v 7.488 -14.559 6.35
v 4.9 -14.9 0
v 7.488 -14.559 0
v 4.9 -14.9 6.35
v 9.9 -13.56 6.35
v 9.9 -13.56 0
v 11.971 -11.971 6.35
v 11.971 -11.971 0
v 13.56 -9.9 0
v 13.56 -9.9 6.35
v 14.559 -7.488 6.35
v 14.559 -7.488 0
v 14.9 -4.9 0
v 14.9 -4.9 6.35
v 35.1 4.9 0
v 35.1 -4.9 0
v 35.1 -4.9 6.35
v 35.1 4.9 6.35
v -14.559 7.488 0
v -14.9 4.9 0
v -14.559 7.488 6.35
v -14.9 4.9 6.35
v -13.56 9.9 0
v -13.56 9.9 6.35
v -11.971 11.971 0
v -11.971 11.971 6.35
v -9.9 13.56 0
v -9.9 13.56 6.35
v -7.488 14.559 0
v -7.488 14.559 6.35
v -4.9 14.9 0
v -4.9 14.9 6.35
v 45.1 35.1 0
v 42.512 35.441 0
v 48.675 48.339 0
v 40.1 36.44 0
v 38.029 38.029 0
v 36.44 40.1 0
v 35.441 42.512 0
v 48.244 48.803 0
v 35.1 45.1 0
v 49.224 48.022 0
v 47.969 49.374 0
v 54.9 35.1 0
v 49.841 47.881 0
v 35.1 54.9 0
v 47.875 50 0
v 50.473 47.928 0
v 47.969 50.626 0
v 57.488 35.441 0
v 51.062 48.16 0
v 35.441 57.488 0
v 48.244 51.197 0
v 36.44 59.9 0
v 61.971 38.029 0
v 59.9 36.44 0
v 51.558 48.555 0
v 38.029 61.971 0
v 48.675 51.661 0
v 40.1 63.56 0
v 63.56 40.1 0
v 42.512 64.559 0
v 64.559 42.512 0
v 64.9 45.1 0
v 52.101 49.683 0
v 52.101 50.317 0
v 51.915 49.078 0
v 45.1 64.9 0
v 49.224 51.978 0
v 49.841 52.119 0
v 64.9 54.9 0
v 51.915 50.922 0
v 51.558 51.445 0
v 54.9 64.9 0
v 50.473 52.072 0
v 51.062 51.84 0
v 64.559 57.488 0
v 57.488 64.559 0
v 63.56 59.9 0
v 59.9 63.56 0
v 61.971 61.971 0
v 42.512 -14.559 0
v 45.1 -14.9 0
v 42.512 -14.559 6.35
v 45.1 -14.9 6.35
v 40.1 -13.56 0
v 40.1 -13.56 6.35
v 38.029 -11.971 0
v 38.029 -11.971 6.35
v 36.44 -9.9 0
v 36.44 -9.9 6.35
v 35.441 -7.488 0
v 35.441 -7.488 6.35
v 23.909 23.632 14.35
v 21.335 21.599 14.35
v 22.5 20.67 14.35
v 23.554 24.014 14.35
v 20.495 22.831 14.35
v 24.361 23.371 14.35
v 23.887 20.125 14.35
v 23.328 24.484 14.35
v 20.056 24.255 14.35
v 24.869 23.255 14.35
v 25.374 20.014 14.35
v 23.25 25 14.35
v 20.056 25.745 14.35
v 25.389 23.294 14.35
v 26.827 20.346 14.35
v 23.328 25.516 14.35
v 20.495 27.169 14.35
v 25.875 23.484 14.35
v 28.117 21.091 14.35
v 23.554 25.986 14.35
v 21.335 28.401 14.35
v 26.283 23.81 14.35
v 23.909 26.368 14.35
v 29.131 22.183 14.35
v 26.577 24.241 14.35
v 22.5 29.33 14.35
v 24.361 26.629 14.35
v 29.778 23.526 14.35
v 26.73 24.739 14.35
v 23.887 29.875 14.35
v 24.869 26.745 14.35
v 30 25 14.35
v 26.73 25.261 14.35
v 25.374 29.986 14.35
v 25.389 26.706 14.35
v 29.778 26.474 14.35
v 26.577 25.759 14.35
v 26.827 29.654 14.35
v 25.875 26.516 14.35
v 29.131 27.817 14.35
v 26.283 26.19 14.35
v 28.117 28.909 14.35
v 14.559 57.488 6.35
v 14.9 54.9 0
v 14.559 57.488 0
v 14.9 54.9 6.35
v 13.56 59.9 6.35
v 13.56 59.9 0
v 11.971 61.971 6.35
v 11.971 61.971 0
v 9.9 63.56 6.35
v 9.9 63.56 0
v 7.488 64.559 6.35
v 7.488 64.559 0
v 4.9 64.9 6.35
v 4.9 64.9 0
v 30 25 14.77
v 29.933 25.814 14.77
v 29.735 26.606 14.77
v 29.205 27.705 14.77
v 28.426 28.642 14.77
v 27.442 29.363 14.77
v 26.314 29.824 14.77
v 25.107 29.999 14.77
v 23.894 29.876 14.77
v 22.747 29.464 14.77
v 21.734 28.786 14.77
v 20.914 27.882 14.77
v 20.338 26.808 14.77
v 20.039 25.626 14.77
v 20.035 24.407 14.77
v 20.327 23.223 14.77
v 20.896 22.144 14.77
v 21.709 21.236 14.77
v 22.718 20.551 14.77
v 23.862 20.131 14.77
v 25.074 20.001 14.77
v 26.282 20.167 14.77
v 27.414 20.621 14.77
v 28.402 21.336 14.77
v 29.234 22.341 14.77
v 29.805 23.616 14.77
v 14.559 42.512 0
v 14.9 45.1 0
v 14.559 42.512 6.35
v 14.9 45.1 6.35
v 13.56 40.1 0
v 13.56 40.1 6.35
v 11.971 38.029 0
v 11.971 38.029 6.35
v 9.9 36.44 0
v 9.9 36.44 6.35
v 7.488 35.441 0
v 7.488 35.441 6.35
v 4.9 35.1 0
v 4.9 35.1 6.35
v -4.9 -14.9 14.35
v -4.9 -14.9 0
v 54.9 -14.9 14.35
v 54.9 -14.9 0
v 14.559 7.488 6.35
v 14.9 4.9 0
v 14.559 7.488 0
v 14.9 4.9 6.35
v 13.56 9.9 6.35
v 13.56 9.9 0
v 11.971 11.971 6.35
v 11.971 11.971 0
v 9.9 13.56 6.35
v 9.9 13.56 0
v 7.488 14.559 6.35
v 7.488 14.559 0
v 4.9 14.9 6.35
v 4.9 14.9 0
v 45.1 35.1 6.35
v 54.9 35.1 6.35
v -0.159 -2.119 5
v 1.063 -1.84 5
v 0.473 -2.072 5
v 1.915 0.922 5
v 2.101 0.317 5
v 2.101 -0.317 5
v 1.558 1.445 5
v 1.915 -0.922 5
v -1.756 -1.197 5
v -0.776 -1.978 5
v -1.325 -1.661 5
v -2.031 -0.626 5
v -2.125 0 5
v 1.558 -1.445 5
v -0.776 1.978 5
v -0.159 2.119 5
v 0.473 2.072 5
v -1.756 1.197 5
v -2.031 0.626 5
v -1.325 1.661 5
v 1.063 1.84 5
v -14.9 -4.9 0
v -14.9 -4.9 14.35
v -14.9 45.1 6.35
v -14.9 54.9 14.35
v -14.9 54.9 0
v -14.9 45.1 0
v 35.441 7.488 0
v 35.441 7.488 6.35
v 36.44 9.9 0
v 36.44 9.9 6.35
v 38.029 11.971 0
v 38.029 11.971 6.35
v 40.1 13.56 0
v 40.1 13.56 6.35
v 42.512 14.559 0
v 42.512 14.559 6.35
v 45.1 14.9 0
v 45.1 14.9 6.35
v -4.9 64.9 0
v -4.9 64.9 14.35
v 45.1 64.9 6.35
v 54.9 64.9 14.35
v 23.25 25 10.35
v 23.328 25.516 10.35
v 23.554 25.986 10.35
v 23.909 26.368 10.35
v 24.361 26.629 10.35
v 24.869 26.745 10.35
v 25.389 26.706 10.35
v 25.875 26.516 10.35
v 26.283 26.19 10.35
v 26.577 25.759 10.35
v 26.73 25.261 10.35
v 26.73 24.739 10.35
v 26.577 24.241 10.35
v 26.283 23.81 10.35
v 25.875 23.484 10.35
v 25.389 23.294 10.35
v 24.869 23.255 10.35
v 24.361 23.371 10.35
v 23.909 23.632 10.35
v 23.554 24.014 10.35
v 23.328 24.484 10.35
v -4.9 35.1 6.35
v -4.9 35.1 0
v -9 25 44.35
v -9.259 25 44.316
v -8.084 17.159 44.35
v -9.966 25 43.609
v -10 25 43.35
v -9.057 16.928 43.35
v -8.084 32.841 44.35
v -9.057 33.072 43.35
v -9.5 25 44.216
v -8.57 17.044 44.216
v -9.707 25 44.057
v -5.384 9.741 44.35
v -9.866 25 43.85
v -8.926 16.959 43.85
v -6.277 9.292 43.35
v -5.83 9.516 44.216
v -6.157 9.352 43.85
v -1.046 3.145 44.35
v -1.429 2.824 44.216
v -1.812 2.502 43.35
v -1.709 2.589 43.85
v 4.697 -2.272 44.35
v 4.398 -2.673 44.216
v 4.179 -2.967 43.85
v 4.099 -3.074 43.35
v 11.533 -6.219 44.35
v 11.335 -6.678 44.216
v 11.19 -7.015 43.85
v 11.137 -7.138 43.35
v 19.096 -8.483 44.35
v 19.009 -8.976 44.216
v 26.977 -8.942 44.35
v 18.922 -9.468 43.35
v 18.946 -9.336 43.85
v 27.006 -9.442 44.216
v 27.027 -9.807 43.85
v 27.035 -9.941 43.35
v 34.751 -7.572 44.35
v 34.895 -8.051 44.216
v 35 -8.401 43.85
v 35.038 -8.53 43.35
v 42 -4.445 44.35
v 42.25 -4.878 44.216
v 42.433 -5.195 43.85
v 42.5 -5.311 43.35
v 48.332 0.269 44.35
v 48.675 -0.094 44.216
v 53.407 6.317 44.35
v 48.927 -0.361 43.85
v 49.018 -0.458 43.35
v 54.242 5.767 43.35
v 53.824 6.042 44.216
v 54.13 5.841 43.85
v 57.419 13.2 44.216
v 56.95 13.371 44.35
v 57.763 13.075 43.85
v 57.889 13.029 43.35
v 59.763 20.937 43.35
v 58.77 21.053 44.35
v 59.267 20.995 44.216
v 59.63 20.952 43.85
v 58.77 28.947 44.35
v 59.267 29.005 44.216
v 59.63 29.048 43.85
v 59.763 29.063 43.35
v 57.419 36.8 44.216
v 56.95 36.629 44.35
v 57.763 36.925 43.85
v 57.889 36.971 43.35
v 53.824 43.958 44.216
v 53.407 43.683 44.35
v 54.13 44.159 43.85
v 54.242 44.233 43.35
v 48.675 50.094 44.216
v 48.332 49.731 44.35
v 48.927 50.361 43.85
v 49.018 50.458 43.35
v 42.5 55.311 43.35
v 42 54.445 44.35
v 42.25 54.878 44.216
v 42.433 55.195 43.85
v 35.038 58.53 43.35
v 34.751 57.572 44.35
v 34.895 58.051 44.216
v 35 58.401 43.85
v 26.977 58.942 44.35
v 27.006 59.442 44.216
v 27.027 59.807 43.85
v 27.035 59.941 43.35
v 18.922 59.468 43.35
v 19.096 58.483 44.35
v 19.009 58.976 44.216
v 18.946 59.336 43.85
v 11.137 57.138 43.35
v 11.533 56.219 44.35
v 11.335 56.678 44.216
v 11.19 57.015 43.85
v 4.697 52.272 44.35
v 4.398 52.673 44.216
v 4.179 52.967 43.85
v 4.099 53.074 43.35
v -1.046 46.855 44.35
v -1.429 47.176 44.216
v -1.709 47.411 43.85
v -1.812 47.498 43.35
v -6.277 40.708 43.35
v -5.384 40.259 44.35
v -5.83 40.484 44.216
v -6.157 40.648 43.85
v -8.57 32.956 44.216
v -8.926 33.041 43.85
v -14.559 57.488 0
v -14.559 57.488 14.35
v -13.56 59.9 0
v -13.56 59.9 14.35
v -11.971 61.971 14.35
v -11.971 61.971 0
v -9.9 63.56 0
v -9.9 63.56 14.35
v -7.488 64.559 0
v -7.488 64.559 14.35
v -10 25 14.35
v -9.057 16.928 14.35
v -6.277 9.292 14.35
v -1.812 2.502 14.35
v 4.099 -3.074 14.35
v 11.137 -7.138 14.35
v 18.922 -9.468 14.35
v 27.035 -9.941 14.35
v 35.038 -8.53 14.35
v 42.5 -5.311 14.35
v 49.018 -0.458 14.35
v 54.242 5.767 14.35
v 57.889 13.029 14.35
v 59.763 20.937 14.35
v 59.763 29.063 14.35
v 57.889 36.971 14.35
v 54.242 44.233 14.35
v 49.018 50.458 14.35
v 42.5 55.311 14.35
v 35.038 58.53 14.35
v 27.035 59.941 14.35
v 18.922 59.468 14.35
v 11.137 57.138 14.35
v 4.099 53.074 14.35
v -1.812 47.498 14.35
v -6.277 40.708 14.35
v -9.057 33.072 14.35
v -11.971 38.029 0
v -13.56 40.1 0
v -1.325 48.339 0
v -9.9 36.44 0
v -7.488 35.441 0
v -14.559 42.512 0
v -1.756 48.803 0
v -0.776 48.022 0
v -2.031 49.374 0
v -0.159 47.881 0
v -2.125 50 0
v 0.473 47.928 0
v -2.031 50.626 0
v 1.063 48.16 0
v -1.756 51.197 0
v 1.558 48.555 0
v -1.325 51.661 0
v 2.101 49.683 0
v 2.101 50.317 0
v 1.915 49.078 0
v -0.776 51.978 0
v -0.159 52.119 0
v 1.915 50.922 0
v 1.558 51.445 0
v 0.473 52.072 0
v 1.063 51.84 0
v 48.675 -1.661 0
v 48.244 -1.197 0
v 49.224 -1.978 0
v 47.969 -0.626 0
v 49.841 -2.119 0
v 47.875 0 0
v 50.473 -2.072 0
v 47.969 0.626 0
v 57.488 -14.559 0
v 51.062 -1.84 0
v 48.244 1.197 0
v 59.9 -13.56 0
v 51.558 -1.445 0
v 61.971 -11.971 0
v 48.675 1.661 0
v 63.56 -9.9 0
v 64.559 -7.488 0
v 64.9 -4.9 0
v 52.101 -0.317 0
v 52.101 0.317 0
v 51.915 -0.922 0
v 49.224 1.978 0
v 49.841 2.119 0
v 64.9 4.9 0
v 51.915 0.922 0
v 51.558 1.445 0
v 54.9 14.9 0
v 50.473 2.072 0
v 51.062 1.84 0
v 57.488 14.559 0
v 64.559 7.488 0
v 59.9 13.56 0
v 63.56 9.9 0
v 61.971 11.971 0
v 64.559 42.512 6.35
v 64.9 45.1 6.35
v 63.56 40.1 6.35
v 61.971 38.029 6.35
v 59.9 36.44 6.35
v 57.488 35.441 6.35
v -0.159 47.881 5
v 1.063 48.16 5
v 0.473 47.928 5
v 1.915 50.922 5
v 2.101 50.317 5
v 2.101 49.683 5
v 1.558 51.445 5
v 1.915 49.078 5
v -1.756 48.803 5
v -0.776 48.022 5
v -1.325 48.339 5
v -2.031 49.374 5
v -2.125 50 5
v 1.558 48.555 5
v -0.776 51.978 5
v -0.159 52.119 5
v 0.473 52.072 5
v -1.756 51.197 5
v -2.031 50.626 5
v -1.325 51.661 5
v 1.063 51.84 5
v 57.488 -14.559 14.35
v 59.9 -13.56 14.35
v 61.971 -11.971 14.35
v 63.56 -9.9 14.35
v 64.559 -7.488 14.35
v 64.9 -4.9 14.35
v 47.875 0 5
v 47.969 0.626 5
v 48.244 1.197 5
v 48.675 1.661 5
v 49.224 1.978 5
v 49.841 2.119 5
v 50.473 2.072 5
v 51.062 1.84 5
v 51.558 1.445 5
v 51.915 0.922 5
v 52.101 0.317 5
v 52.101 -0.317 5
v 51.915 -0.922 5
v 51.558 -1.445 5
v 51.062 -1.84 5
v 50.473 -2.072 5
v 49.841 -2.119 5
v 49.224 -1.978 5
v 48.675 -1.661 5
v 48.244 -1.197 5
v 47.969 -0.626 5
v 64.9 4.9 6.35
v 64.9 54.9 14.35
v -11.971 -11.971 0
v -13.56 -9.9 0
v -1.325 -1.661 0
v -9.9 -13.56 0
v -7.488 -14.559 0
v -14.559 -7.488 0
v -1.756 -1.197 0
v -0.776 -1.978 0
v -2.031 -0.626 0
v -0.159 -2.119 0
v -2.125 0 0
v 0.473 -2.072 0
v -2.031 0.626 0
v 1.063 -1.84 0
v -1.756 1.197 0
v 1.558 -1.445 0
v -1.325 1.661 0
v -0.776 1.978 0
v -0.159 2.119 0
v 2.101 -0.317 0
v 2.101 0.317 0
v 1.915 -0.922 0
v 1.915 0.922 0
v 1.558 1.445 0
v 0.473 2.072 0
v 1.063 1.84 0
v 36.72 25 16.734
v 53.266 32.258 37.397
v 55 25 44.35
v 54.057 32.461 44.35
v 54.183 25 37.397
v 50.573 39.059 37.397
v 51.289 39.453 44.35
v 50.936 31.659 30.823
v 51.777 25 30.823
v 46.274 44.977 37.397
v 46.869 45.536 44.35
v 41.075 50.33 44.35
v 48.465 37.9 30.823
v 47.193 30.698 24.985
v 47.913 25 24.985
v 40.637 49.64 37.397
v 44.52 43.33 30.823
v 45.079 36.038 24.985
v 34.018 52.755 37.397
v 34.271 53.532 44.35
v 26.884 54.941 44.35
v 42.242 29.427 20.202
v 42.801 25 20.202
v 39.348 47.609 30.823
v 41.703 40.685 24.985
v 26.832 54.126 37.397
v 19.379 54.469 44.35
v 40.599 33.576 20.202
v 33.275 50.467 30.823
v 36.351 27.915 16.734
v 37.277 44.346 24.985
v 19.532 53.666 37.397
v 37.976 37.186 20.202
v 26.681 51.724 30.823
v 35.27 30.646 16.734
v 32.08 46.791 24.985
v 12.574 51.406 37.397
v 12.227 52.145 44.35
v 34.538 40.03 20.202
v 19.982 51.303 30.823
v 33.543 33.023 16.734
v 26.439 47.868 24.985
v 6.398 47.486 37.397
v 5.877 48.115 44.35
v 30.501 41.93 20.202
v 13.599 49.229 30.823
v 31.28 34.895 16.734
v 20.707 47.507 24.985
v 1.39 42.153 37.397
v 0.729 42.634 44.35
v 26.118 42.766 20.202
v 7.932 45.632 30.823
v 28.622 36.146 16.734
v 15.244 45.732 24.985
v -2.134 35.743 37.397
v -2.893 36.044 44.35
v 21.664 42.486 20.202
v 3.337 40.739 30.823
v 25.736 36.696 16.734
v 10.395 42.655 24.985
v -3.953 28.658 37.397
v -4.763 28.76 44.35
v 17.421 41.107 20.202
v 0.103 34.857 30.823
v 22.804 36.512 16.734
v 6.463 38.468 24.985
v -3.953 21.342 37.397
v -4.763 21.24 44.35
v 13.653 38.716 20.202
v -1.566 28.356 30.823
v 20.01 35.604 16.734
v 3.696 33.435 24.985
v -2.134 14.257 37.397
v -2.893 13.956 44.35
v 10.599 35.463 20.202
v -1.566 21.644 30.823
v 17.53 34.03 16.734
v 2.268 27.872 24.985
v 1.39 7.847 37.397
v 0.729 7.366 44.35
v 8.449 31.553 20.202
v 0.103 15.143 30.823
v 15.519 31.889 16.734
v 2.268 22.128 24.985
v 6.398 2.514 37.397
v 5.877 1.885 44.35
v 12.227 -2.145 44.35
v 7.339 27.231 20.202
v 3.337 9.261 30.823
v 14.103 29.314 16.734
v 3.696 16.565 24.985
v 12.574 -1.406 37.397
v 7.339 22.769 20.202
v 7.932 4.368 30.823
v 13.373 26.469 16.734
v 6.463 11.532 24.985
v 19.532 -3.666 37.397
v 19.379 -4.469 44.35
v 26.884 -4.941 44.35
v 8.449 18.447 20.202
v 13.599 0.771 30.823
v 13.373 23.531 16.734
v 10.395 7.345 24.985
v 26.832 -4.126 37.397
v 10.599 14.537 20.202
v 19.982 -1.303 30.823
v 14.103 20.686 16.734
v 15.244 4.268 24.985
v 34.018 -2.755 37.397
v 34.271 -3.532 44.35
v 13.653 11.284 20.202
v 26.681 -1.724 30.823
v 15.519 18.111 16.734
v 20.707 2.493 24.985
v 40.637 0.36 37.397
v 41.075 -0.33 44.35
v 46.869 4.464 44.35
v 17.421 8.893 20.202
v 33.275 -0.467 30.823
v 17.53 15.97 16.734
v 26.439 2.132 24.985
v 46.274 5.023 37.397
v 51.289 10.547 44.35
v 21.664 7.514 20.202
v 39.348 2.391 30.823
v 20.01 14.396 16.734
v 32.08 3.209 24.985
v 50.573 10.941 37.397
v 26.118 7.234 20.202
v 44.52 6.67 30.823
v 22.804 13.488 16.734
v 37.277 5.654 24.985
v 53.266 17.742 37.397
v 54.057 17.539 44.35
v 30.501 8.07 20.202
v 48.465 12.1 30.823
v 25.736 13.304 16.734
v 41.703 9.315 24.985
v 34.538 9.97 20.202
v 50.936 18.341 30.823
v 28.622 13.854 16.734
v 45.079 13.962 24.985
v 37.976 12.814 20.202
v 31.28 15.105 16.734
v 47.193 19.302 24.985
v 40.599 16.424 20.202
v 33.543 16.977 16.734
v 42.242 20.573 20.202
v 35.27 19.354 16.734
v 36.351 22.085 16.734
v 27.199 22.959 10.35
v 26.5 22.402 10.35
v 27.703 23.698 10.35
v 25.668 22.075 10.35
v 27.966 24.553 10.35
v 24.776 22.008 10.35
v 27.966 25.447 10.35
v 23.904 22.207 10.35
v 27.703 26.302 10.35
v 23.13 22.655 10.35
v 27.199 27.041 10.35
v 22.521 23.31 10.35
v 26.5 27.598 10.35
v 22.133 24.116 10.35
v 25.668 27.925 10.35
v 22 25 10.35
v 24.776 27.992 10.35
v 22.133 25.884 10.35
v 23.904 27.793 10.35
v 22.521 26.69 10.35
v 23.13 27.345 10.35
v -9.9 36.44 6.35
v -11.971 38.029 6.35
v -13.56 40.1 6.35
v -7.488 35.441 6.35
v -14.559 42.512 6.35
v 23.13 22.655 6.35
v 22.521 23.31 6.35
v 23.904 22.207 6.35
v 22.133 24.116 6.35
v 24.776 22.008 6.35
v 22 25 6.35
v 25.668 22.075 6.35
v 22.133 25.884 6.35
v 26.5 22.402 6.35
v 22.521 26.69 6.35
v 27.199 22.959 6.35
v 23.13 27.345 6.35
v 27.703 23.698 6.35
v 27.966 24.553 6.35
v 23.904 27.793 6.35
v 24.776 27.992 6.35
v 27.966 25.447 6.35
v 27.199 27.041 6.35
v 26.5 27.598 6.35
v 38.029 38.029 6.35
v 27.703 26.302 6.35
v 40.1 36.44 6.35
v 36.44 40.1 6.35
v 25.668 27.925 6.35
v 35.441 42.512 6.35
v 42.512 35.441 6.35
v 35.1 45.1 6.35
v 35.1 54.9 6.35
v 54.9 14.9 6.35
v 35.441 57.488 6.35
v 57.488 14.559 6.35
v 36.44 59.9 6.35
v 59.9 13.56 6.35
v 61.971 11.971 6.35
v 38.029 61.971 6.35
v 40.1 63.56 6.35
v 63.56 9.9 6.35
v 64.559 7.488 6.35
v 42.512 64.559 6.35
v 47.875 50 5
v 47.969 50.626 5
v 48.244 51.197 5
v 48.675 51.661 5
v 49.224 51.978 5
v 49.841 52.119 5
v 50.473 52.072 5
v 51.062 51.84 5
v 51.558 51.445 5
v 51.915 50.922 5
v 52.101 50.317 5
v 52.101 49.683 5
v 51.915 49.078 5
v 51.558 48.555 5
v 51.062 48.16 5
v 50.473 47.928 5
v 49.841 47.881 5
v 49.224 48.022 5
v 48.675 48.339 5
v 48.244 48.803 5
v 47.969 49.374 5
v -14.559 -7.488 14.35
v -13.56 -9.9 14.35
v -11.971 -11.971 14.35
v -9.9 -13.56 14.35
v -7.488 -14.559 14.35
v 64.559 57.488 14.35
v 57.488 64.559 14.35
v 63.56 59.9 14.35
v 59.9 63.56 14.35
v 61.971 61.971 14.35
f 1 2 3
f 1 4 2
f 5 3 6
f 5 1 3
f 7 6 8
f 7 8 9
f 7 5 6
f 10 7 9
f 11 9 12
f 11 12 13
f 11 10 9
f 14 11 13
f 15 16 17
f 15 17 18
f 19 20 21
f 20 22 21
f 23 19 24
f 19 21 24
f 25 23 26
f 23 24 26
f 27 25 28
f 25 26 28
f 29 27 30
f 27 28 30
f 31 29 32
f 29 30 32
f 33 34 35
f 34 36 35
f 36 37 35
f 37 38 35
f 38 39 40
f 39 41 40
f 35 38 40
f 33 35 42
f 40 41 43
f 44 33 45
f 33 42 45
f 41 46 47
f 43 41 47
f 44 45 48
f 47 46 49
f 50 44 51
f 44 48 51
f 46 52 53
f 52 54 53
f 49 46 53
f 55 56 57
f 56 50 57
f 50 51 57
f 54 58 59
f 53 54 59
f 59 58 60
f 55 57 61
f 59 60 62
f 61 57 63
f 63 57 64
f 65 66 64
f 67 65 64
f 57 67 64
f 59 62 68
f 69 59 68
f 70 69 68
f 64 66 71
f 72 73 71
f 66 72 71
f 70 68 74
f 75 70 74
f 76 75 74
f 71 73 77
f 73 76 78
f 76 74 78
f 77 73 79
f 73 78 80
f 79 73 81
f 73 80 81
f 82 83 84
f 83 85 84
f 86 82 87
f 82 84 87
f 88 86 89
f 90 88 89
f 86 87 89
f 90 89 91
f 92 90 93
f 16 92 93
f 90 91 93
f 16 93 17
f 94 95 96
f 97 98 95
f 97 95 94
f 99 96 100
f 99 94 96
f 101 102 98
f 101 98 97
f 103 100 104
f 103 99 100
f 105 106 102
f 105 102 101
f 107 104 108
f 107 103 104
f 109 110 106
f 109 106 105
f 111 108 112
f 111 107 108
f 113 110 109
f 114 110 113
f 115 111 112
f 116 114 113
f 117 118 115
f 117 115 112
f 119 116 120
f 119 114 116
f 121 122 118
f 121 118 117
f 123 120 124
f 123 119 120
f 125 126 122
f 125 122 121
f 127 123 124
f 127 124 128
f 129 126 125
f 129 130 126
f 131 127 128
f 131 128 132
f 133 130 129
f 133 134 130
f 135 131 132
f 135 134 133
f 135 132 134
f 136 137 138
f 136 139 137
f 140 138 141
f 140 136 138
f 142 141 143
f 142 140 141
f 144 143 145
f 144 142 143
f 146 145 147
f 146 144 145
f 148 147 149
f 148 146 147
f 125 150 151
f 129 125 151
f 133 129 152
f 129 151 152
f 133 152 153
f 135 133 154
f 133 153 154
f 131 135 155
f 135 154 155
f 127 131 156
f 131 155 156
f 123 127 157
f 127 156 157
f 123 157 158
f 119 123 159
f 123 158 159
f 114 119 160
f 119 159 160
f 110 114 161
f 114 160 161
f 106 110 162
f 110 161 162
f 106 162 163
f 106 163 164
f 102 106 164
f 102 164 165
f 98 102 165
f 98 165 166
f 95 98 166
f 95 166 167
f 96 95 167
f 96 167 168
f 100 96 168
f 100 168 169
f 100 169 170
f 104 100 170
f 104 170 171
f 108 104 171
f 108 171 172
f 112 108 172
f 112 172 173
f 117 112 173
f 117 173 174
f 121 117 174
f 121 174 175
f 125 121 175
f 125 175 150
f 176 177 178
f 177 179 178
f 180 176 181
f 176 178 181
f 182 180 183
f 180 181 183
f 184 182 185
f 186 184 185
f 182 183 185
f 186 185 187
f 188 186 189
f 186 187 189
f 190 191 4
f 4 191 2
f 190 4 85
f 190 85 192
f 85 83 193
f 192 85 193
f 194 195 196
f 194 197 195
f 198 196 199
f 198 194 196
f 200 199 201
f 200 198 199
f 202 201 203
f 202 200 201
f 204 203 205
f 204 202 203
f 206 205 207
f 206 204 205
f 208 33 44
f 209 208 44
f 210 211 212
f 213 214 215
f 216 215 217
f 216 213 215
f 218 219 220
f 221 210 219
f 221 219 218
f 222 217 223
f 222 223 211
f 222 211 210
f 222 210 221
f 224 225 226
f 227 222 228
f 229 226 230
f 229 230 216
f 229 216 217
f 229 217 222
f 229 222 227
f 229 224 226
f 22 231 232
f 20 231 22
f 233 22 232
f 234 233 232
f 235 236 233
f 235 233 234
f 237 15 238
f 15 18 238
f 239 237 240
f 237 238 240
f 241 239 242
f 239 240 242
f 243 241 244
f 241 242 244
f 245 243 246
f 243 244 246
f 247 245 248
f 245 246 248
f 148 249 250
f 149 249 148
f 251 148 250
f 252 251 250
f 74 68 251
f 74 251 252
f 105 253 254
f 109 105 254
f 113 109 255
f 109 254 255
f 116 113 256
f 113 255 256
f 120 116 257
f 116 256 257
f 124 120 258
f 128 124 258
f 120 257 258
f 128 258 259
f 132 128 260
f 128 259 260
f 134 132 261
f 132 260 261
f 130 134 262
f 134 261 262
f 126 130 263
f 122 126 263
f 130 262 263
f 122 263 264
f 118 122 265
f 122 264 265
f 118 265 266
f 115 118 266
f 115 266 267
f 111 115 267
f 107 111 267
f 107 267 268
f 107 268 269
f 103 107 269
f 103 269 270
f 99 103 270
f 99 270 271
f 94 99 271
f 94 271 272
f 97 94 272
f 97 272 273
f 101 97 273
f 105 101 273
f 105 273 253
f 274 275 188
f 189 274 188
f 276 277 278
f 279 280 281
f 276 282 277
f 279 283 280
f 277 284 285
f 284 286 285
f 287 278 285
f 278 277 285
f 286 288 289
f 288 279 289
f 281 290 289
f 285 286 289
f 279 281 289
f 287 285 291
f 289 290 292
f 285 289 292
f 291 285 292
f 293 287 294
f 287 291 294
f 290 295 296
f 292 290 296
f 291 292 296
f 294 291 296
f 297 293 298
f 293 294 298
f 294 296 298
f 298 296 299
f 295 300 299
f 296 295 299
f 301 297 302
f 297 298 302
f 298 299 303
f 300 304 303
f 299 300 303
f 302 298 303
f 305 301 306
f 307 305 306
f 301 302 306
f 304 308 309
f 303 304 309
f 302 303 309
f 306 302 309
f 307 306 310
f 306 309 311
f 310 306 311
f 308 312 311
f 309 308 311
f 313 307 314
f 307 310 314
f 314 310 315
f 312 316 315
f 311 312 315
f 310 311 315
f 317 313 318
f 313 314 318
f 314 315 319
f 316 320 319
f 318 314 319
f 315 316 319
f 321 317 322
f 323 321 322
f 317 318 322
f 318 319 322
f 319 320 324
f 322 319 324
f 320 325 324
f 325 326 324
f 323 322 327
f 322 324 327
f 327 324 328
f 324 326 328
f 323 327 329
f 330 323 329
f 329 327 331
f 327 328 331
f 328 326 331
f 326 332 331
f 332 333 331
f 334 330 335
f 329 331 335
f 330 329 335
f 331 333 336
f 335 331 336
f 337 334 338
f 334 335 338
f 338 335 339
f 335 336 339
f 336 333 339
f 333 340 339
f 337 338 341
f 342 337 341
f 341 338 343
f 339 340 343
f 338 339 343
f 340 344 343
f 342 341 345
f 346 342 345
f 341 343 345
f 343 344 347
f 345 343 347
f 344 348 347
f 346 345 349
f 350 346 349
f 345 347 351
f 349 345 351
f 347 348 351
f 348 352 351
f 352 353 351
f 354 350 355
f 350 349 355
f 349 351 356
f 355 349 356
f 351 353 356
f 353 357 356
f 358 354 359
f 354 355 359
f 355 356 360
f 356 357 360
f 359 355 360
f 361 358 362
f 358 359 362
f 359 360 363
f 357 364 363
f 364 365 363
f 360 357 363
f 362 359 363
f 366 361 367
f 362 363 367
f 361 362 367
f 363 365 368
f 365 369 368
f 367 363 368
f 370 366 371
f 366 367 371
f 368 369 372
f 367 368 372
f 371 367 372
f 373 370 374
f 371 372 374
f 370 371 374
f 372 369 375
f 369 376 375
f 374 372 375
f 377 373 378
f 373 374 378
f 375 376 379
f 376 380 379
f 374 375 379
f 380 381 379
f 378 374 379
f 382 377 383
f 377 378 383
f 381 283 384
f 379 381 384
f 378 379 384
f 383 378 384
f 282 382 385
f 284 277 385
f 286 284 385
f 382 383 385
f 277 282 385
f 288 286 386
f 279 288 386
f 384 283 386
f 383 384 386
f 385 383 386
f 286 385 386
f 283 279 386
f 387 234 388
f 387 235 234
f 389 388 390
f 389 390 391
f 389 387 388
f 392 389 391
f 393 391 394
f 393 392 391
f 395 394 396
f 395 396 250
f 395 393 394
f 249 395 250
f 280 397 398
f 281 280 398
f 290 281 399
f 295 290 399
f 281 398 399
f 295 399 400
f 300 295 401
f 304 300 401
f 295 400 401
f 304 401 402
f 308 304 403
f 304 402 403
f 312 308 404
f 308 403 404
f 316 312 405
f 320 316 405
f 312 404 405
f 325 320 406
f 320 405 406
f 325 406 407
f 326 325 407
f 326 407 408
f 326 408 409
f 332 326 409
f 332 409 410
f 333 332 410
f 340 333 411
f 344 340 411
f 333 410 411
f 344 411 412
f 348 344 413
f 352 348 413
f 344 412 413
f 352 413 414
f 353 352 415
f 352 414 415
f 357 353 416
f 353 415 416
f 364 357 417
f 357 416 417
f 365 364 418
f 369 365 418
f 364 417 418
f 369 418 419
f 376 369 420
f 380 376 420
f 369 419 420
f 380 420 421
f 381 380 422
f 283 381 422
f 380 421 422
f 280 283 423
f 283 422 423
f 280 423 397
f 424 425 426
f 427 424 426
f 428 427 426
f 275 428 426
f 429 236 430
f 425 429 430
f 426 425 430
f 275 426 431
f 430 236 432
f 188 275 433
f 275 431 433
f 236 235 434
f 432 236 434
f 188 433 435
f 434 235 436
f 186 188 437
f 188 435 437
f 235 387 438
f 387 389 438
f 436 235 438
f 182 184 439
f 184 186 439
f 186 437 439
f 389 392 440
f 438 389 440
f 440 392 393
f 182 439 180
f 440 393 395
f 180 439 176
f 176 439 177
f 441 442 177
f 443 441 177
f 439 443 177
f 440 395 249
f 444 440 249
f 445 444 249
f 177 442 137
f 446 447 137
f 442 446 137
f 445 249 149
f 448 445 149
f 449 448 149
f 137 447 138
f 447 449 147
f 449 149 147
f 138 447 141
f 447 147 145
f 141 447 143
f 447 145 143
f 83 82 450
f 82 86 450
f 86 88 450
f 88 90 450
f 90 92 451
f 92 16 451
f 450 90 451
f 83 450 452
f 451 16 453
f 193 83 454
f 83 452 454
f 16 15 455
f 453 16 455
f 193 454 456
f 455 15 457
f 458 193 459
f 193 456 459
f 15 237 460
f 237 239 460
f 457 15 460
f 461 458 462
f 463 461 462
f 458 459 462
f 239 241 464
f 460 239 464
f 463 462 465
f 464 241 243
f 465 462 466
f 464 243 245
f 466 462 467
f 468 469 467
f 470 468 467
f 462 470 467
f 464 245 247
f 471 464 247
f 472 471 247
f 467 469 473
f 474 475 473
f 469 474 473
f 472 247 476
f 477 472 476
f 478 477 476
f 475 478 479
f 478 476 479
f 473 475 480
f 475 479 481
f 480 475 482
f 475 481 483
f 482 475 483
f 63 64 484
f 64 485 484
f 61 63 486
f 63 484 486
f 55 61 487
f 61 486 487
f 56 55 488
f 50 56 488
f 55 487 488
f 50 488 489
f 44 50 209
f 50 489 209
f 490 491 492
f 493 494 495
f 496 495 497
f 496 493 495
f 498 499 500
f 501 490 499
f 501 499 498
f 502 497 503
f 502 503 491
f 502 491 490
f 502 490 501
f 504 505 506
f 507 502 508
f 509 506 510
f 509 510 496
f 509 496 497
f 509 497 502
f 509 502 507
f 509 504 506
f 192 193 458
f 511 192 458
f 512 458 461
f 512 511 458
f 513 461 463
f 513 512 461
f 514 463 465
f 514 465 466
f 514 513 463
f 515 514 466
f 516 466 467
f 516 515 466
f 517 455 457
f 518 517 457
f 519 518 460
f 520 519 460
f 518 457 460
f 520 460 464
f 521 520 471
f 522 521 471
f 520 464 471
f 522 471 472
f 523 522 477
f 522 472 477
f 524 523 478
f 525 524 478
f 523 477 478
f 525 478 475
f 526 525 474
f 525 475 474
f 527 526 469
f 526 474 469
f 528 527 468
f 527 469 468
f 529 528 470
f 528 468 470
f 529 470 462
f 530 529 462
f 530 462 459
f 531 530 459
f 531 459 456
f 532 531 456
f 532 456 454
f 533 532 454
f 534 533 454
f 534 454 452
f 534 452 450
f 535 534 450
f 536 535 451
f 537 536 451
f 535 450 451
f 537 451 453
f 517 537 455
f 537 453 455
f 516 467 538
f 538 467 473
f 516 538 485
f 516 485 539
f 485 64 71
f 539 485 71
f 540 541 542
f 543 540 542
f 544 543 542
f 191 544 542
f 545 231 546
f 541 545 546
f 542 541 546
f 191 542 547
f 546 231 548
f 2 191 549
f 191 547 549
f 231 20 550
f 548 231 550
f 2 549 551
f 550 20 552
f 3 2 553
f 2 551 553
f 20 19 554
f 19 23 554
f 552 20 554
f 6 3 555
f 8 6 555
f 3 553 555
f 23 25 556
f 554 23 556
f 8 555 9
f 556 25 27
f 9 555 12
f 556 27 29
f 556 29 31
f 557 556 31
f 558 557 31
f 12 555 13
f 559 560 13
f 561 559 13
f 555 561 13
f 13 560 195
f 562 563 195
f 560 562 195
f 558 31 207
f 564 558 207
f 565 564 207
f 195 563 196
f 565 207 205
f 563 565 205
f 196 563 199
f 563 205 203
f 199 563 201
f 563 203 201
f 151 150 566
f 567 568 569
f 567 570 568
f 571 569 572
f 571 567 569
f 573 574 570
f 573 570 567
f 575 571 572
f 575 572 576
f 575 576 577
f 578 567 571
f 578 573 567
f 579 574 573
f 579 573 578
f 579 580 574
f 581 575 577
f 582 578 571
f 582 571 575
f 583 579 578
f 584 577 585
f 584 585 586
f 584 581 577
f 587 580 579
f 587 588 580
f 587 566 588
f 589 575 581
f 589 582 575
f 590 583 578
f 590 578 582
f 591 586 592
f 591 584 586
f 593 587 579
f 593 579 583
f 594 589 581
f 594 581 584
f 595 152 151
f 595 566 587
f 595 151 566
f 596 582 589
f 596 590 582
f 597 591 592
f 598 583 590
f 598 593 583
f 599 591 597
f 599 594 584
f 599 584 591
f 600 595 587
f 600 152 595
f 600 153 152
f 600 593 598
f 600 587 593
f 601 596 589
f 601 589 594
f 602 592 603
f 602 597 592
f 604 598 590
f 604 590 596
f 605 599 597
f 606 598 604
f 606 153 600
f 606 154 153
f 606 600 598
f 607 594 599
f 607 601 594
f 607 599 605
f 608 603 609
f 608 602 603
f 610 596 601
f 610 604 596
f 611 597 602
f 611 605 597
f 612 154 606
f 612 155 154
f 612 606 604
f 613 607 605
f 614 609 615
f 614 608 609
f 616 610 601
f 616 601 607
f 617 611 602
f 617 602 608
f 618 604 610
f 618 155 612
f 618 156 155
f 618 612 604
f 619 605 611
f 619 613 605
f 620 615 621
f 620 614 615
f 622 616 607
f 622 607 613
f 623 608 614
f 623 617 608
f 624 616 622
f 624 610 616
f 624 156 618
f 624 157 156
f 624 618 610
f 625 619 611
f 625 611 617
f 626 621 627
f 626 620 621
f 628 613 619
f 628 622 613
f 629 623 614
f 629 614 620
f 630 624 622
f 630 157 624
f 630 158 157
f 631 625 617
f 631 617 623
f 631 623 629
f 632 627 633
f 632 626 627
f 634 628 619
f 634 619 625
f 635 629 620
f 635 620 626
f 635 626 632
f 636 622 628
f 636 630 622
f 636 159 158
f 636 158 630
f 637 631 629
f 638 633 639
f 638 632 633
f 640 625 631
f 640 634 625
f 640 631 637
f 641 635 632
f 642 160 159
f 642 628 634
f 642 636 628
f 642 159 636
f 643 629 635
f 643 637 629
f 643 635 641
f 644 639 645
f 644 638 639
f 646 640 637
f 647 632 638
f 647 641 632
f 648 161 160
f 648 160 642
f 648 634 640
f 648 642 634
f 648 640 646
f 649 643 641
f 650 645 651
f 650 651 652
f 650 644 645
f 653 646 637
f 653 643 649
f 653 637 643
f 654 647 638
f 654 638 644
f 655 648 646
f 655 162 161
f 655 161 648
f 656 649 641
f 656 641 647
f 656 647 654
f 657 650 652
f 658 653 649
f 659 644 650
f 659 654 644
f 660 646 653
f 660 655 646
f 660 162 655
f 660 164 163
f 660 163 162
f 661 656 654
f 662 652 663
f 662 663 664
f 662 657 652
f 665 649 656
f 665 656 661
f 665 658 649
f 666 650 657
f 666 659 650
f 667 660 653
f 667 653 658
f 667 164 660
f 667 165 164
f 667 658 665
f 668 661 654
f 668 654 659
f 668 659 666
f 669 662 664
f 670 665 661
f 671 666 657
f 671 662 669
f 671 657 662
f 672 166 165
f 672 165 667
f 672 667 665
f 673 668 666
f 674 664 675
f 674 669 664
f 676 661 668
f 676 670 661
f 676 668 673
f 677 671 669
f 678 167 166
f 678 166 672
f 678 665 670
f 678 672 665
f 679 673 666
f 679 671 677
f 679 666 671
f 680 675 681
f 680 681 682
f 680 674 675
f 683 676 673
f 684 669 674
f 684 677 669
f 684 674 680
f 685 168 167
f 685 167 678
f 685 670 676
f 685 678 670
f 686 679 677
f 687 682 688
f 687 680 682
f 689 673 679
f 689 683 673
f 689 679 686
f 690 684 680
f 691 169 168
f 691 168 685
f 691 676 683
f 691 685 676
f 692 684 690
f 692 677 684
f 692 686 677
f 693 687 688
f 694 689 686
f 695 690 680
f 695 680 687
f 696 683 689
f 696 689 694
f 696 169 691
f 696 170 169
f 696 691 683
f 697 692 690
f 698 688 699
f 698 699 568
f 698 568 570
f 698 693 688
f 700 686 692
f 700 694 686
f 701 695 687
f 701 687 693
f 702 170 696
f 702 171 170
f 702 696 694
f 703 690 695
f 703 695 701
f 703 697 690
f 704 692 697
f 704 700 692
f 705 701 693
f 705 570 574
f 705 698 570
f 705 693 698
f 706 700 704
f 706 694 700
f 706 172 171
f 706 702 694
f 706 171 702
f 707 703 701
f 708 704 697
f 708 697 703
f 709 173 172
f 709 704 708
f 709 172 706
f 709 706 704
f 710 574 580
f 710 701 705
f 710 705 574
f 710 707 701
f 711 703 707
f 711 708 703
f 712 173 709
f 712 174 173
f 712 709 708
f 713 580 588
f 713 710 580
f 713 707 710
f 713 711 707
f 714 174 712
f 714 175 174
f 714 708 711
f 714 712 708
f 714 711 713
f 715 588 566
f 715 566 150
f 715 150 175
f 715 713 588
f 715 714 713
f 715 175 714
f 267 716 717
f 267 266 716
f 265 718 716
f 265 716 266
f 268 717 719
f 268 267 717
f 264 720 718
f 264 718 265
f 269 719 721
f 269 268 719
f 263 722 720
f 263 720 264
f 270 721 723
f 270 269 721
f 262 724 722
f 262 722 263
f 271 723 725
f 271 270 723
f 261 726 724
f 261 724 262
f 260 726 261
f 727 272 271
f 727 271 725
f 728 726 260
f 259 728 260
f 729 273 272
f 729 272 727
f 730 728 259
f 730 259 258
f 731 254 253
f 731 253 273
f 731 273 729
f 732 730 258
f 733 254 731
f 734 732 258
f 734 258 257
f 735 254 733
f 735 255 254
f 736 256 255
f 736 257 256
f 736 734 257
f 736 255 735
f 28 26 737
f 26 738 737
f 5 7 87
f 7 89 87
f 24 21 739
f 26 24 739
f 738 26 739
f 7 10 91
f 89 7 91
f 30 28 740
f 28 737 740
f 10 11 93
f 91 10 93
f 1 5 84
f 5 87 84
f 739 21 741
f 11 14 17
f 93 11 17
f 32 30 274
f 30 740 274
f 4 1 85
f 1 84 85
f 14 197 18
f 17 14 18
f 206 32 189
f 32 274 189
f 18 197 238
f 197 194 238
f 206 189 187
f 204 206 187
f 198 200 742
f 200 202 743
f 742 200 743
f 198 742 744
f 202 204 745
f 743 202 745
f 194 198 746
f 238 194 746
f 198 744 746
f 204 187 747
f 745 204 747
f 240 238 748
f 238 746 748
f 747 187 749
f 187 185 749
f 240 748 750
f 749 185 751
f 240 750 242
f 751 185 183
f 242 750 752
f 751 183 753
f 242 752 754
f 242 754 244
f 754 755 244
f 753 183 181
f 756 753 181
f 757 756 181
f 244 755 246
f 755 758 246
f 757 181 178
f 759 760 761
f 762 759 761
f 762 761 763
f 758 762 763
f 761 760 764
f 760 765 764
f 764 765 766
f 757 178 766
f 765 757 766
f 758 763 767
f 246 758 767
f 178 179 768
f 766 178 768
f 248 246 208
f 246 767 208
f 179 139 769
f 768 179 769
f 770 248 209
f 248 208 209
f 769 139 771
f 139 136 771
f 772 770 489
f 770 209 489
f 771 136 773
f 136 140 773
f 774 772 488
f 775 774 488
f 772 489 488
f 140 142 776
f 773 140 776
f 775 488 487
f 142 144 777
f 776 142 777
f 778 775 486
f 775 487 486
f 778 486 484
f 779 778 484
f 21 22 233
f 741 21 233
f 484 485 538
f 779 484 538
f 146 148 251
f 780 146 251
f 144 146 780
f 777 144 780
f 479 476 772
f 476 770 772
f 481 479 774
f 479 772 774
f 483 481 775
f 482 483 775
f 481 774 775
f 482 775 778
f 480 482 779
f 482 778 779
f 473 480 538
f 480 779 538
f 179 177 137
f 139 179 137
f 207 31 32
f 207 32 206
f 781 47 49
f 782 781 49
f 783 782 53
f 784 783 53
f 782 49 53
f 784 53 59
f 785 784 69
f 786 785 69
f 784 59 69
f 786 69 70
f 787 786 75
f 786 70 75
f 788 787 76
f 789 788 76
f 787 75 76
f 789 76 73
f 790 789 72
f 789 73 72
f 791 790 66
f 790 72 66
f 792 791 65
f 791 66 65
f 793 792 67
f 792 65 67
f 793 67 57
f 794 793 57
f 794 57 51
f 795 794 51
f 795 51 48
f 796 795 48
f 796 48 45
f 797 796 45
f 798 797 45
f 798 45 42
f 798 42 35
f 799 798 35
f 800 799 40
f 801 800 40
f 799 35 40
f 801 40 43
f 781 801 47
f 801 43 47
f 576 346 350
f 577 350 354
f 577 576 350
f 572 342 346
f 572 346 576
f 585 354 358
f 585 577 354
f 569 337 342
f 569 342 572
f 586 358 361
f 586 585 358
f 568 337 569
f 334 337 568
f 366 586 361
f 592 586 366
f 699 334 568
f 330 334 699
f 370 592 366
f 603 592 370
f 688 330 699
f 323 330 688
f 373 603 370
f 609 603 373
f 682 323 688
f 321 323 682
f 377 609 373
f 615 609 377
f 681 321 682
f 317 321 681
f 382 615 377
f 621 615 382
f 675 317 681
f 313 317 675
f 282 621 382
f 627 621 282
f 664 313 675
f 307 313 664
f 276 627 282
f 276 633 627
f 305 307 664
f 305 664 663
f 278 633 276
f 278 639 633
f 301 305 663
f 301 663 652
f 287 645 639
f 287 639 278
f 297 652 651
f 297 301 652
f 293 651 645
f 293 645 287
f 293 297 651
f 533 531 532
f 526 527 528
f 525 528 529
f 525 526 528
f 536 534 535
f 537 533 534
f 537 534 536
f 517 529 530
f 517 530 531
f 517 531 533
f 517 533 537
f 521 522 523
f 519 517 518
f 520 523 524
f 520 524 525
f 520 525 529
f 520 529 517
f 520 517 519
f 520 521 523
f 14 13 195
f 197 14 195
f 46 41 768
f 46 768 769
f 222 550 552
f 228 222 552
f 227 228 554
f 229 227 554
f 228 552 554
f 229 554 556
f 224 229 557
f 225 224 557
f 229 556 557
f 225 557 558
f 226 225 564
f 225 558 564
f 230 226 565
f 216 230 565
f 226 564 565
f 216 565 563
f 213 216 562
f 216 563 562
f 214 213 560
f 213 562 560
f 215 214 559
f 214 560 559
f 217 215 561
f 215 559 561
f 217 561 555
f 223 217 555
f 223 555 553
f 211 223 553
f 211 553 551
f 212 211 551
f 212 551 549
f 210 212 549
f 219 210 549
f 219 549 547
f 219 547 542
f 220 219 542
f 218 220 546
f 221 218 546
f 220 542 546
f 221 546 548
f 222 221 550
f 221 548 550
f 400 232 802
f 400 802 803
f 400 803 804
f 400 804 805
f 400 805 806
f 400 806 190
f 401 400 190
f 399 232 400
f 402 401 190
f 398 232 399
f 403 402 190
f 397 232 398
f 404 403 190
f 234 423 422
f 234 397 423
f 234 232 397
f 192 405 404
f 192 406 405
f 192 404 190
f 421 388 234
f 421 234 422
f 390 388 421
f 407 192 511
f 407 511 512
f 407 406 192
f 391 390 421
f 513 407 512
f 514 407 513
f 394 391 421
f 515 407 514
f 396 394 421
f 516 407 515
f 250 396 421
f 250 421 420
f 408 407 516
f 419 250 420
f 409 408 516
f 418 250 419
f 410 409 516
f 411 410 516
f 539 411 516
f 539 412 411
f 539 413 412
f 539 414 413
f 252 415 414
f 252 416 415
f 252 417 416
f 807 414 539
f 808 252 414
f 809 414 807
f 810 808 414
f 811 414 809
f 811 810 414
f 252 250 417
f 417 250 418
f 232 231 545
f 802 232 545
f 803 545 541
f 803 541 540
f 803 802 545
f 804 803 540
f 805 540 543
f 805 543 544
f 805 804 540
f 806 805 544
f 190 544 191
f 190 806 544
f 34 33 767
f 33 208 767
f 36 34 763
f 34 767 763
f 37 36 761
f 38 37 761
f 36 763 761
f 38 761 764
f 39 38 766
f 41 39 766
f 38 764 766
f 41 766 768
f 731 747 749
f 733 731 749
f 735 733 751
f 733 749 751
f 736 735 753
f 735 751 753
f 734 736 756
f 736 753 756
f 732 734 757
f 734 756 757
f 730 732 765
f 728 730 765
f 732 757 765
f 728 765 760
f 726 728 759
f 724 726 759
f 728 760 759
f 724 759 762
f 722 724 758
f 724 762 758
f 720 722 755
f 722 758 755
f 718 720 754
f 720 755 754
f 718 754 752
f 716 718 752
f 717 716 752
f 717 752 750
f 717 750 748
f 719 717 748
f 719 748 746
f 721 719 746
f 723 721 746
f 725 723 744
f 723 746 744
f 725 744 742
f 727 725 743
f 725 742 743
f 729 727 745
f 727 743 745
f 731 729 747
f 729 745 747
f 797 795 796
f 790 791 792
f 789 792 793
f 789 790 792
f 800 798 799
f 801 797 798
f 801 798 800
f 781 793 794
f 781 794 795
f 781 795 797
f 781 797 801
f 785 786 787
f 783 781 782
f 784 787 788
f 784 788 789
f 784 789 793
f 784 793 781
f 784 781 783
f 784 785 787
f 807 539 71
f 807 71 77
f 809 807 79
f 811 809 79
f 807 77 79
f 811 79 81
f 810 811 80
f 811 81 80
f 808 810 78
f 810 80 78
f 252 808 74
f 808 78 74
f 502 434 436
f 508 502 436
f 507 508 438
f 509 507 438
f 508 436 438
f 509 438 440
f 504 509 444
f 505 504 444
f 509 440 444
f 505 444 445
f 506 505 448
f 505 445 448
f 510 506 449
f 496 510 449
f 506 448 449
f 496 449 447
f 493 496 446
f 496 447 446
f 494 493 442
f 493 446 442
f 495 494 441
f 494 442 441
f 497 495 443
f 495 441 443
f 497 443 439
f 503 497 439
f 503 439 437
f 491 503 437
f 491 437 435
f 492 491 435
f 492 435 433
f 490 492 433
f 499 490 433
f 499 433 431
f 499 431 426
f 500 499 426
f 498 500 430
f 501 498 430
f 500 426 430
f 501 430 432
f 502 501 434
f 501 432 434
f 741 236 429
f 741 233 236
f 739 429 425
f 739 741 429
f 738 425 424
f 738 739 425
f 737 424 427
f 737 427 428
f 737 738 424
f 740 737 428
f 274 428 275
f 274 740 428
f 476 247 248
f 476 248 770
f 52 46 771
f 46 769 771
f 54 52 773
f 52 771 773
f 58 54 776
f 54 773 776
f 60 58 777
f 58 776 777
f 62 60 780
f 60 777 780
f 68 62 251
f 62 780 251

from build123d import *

# Parameters (mm, degrees)
SKETCH1_W             = 29.8
SKETCH1_H             = 29.8
BOSS_EXTRUDE1_DEPTH   = 6.35
BOSS_EXTRUDE1_2_DEPTH = 6.35
BOSS_EXTRUDE1_3_DEPTH = 6.35
BOSS_EXTRUDE1_4_DEPTH = 6.35
SKETCH2_W             = 79.8
SKETCH2_H             = 79.8
BOSS_EXTRUDE2_DEPTH   = 8
FILLET2_R             = 10
SKETCH3_R             = 35
SKETCH3_R_2           = 30
BOSS_EXTRUDE3_DEPTH   = 30
FILLET3_R             = 30
FILLET4_R             = 1
SKETCH4_R             = 2.125
CUT_EXTRUDE1_DEPTH    = 5
SKETCH6_R             = 5
CUT_EXTRUDE2_DEPTH    = 30
SKETCH7_R             = 1.75
CUT_EXTRUDE3_DEPTH    = 100.337908172
SKETCH8_R             = 3
CUT_EXTRUDE4_DEPTH    = 4


with BuildPart() as part:
    # Sketch1 → Boss-Extrude1 (new body)
    with BuildSketch(Plane.XY):
        Rectangle(SKETCH1_W, SKETCH1_H)
    extrude(amount=BOSS_EXTRUDE1_DEPTH)



with BuildPart() as body_2:
    # Sketch1 → Boss-Extrude1 2 (new body)
    with BuildSketch(Plane.XY):
        with Locations((50, 0)):
            Rectangle(SKETCH1_W, SKETCH1_H)
    extrude(amount=BOSS_EXTRUDE1_2_DEPTH)


with BuildPart() as body_3:
    # Sketch1 → Boss-Extrude1 3 (new body)
    with BuildSketch(Plane.XY):
        with Locations((50, 50)):
            Rectangle(SKETCH1_W, SKETCH1_H)
    extrude(amount=BOSS_EXTRUDE1_3_DEPTH)


with BuildPart() as body_4:
    # Sketch1 → Boss-Extrude1 4 (new body)
    with BuildSketch(Plane.XY):
        with Locations((0, 50)):
            Rectangle(SKETCH1_W, SKETCH1_H)
    extrude(amount=BOSS_EXTRUDE1_4_DEPTH)


with BuildPart() as part_1:
    add(part.part)

    add(body_2.part)  # Boss-Extrude2 merges body 2

    add(body_3.part)  # Boss-Extrude2 merges body 3

    add(body_4.part)  # Boss-Extrude2 merges body 4
    # Sketch2 → Boss-Extrude2 (add)
    with BuildSketch(Plane.XY.offset(6.35)):
        with Locations((25, 25)):
            Rectangle(SKETCH2_W, SKETCH2_H)
    extrude(amount=BOSS_EXTRUDE2_DEPTH)

    # Fillet2
    fillet2_edges = [part_1.edges().sort_by_distance(p)[0] for p in [
        (-14.9, 64.9, 7.175),
        (64.9, -14.9, 7.175),
        (64.9, 64.9, 7.175),
        (35.1, 14.9, 3.175),
        (35.1, -14.9, 3.175),
        (64.9, 14.9, 3.175),
        (35.1, 64.9, 3.175),
        (35.1, 35.1, 3.175),
        (64.9, 35.1, 3.175),
        (-14.9, 35.1, 3.175),
        (14.9, 35.1, 3.175),
        (14.9, 64.9, 3.175),
        (-14.9, 14.9, 3.175),
        (14.9, 14.9, 3.175),
        (14.9, -14.9, 3.175),
        (-14.9, -14.9, 7.175),
    ]]
    fillet(fillet2_edges, radius=FILLET2_R)

    # Sketch3 → Boss-Extrude3 (add)
    with BuildSketch(Plane.XY.offset(14.35)):
        with Locations(Location((25, 25, 0), (0, 0, 180))):
            Circle(SKETCH3_R)
        with Locations((25, 25)):
            Circle(SKETCH3_R_2, mode=Mode.SUBTRACT)
    extrude(amount=BOSS_EXTRUDE3_DEPTH)

    # Fillet3
    fillet3_edges = [part_1.edges().sort_by_distance(p)[0] for p in [
        (-5, 25, 14.35),
    ]]
    fillet(fillet3_edges, radius=FILLET3_R - 0.0001)  # a hair under: the kernel refuses the full size

    # Fillet4
    fillet4_edges = [part_1.edges().sort_by_distance(p)[0] for p in [
        (60, 25, 44.35),
    ]]
    fillet(fillet4_edges, radius=FILLET4_R)

    # Sketch4 → Cut-Extrude1 (cut)
    with BuildSketch(Plane(origin=(0, 0, 0), x_dir=(-1, 0, 0), z_dir=(0, 0, -1))):
        with Locations((0, 50)):
            Circle(SKETCH4_R)
        Circle(SKETCH4_R)
        with Locations((-50, 0)):
            Circle(SKETCH4_R)
        with Locations((-50, 50)):
            Circle(SKETCH4_R)
    extrude(amount=-CUT_EXTRUDE1_DEPTH, mode=Mode.SUBTRACT)

    # Sketch6 → Cut-Extrude2 (cut)
    with BuildSketch(Plane.XY.offset(44.35)):
        with Locations((25, 25)):
            Circle(SKETCH6_R)
    extrude(amount=-CUT_EXTRUDE2_DEPTH, mode=Mode.SUBTRACT)

    # Sketch7 → Cut-Extrude3 (cut, through all)
    with BuildSketch(Plane(origin=(0, 0, 6.35), x_dir=(-1, 0, 0), z_dir=(0, 0, -1))):
        with Locations((-25, 25)):
            Circle(SKETCH7_R)
    extrude(amount=-CUT_EXTRUDE3_DEPTH, mode=Mode.SUBTRACT)

    # Sketch8 → Cut-Extrude4 (cut)
    with BuildSketch(Plane(origin=(0, 0, 6.35), x_dir=(-1, 0, 0), z_dir=(0, 0, -1))):
        with Locations((-25, 25)):
            Circle(SKETCH8_R)
    extrude(amount=-CUT_EXTRUDE4_DEPTH, mode=Mode.SUBTRACT)


solid = part_1.part
